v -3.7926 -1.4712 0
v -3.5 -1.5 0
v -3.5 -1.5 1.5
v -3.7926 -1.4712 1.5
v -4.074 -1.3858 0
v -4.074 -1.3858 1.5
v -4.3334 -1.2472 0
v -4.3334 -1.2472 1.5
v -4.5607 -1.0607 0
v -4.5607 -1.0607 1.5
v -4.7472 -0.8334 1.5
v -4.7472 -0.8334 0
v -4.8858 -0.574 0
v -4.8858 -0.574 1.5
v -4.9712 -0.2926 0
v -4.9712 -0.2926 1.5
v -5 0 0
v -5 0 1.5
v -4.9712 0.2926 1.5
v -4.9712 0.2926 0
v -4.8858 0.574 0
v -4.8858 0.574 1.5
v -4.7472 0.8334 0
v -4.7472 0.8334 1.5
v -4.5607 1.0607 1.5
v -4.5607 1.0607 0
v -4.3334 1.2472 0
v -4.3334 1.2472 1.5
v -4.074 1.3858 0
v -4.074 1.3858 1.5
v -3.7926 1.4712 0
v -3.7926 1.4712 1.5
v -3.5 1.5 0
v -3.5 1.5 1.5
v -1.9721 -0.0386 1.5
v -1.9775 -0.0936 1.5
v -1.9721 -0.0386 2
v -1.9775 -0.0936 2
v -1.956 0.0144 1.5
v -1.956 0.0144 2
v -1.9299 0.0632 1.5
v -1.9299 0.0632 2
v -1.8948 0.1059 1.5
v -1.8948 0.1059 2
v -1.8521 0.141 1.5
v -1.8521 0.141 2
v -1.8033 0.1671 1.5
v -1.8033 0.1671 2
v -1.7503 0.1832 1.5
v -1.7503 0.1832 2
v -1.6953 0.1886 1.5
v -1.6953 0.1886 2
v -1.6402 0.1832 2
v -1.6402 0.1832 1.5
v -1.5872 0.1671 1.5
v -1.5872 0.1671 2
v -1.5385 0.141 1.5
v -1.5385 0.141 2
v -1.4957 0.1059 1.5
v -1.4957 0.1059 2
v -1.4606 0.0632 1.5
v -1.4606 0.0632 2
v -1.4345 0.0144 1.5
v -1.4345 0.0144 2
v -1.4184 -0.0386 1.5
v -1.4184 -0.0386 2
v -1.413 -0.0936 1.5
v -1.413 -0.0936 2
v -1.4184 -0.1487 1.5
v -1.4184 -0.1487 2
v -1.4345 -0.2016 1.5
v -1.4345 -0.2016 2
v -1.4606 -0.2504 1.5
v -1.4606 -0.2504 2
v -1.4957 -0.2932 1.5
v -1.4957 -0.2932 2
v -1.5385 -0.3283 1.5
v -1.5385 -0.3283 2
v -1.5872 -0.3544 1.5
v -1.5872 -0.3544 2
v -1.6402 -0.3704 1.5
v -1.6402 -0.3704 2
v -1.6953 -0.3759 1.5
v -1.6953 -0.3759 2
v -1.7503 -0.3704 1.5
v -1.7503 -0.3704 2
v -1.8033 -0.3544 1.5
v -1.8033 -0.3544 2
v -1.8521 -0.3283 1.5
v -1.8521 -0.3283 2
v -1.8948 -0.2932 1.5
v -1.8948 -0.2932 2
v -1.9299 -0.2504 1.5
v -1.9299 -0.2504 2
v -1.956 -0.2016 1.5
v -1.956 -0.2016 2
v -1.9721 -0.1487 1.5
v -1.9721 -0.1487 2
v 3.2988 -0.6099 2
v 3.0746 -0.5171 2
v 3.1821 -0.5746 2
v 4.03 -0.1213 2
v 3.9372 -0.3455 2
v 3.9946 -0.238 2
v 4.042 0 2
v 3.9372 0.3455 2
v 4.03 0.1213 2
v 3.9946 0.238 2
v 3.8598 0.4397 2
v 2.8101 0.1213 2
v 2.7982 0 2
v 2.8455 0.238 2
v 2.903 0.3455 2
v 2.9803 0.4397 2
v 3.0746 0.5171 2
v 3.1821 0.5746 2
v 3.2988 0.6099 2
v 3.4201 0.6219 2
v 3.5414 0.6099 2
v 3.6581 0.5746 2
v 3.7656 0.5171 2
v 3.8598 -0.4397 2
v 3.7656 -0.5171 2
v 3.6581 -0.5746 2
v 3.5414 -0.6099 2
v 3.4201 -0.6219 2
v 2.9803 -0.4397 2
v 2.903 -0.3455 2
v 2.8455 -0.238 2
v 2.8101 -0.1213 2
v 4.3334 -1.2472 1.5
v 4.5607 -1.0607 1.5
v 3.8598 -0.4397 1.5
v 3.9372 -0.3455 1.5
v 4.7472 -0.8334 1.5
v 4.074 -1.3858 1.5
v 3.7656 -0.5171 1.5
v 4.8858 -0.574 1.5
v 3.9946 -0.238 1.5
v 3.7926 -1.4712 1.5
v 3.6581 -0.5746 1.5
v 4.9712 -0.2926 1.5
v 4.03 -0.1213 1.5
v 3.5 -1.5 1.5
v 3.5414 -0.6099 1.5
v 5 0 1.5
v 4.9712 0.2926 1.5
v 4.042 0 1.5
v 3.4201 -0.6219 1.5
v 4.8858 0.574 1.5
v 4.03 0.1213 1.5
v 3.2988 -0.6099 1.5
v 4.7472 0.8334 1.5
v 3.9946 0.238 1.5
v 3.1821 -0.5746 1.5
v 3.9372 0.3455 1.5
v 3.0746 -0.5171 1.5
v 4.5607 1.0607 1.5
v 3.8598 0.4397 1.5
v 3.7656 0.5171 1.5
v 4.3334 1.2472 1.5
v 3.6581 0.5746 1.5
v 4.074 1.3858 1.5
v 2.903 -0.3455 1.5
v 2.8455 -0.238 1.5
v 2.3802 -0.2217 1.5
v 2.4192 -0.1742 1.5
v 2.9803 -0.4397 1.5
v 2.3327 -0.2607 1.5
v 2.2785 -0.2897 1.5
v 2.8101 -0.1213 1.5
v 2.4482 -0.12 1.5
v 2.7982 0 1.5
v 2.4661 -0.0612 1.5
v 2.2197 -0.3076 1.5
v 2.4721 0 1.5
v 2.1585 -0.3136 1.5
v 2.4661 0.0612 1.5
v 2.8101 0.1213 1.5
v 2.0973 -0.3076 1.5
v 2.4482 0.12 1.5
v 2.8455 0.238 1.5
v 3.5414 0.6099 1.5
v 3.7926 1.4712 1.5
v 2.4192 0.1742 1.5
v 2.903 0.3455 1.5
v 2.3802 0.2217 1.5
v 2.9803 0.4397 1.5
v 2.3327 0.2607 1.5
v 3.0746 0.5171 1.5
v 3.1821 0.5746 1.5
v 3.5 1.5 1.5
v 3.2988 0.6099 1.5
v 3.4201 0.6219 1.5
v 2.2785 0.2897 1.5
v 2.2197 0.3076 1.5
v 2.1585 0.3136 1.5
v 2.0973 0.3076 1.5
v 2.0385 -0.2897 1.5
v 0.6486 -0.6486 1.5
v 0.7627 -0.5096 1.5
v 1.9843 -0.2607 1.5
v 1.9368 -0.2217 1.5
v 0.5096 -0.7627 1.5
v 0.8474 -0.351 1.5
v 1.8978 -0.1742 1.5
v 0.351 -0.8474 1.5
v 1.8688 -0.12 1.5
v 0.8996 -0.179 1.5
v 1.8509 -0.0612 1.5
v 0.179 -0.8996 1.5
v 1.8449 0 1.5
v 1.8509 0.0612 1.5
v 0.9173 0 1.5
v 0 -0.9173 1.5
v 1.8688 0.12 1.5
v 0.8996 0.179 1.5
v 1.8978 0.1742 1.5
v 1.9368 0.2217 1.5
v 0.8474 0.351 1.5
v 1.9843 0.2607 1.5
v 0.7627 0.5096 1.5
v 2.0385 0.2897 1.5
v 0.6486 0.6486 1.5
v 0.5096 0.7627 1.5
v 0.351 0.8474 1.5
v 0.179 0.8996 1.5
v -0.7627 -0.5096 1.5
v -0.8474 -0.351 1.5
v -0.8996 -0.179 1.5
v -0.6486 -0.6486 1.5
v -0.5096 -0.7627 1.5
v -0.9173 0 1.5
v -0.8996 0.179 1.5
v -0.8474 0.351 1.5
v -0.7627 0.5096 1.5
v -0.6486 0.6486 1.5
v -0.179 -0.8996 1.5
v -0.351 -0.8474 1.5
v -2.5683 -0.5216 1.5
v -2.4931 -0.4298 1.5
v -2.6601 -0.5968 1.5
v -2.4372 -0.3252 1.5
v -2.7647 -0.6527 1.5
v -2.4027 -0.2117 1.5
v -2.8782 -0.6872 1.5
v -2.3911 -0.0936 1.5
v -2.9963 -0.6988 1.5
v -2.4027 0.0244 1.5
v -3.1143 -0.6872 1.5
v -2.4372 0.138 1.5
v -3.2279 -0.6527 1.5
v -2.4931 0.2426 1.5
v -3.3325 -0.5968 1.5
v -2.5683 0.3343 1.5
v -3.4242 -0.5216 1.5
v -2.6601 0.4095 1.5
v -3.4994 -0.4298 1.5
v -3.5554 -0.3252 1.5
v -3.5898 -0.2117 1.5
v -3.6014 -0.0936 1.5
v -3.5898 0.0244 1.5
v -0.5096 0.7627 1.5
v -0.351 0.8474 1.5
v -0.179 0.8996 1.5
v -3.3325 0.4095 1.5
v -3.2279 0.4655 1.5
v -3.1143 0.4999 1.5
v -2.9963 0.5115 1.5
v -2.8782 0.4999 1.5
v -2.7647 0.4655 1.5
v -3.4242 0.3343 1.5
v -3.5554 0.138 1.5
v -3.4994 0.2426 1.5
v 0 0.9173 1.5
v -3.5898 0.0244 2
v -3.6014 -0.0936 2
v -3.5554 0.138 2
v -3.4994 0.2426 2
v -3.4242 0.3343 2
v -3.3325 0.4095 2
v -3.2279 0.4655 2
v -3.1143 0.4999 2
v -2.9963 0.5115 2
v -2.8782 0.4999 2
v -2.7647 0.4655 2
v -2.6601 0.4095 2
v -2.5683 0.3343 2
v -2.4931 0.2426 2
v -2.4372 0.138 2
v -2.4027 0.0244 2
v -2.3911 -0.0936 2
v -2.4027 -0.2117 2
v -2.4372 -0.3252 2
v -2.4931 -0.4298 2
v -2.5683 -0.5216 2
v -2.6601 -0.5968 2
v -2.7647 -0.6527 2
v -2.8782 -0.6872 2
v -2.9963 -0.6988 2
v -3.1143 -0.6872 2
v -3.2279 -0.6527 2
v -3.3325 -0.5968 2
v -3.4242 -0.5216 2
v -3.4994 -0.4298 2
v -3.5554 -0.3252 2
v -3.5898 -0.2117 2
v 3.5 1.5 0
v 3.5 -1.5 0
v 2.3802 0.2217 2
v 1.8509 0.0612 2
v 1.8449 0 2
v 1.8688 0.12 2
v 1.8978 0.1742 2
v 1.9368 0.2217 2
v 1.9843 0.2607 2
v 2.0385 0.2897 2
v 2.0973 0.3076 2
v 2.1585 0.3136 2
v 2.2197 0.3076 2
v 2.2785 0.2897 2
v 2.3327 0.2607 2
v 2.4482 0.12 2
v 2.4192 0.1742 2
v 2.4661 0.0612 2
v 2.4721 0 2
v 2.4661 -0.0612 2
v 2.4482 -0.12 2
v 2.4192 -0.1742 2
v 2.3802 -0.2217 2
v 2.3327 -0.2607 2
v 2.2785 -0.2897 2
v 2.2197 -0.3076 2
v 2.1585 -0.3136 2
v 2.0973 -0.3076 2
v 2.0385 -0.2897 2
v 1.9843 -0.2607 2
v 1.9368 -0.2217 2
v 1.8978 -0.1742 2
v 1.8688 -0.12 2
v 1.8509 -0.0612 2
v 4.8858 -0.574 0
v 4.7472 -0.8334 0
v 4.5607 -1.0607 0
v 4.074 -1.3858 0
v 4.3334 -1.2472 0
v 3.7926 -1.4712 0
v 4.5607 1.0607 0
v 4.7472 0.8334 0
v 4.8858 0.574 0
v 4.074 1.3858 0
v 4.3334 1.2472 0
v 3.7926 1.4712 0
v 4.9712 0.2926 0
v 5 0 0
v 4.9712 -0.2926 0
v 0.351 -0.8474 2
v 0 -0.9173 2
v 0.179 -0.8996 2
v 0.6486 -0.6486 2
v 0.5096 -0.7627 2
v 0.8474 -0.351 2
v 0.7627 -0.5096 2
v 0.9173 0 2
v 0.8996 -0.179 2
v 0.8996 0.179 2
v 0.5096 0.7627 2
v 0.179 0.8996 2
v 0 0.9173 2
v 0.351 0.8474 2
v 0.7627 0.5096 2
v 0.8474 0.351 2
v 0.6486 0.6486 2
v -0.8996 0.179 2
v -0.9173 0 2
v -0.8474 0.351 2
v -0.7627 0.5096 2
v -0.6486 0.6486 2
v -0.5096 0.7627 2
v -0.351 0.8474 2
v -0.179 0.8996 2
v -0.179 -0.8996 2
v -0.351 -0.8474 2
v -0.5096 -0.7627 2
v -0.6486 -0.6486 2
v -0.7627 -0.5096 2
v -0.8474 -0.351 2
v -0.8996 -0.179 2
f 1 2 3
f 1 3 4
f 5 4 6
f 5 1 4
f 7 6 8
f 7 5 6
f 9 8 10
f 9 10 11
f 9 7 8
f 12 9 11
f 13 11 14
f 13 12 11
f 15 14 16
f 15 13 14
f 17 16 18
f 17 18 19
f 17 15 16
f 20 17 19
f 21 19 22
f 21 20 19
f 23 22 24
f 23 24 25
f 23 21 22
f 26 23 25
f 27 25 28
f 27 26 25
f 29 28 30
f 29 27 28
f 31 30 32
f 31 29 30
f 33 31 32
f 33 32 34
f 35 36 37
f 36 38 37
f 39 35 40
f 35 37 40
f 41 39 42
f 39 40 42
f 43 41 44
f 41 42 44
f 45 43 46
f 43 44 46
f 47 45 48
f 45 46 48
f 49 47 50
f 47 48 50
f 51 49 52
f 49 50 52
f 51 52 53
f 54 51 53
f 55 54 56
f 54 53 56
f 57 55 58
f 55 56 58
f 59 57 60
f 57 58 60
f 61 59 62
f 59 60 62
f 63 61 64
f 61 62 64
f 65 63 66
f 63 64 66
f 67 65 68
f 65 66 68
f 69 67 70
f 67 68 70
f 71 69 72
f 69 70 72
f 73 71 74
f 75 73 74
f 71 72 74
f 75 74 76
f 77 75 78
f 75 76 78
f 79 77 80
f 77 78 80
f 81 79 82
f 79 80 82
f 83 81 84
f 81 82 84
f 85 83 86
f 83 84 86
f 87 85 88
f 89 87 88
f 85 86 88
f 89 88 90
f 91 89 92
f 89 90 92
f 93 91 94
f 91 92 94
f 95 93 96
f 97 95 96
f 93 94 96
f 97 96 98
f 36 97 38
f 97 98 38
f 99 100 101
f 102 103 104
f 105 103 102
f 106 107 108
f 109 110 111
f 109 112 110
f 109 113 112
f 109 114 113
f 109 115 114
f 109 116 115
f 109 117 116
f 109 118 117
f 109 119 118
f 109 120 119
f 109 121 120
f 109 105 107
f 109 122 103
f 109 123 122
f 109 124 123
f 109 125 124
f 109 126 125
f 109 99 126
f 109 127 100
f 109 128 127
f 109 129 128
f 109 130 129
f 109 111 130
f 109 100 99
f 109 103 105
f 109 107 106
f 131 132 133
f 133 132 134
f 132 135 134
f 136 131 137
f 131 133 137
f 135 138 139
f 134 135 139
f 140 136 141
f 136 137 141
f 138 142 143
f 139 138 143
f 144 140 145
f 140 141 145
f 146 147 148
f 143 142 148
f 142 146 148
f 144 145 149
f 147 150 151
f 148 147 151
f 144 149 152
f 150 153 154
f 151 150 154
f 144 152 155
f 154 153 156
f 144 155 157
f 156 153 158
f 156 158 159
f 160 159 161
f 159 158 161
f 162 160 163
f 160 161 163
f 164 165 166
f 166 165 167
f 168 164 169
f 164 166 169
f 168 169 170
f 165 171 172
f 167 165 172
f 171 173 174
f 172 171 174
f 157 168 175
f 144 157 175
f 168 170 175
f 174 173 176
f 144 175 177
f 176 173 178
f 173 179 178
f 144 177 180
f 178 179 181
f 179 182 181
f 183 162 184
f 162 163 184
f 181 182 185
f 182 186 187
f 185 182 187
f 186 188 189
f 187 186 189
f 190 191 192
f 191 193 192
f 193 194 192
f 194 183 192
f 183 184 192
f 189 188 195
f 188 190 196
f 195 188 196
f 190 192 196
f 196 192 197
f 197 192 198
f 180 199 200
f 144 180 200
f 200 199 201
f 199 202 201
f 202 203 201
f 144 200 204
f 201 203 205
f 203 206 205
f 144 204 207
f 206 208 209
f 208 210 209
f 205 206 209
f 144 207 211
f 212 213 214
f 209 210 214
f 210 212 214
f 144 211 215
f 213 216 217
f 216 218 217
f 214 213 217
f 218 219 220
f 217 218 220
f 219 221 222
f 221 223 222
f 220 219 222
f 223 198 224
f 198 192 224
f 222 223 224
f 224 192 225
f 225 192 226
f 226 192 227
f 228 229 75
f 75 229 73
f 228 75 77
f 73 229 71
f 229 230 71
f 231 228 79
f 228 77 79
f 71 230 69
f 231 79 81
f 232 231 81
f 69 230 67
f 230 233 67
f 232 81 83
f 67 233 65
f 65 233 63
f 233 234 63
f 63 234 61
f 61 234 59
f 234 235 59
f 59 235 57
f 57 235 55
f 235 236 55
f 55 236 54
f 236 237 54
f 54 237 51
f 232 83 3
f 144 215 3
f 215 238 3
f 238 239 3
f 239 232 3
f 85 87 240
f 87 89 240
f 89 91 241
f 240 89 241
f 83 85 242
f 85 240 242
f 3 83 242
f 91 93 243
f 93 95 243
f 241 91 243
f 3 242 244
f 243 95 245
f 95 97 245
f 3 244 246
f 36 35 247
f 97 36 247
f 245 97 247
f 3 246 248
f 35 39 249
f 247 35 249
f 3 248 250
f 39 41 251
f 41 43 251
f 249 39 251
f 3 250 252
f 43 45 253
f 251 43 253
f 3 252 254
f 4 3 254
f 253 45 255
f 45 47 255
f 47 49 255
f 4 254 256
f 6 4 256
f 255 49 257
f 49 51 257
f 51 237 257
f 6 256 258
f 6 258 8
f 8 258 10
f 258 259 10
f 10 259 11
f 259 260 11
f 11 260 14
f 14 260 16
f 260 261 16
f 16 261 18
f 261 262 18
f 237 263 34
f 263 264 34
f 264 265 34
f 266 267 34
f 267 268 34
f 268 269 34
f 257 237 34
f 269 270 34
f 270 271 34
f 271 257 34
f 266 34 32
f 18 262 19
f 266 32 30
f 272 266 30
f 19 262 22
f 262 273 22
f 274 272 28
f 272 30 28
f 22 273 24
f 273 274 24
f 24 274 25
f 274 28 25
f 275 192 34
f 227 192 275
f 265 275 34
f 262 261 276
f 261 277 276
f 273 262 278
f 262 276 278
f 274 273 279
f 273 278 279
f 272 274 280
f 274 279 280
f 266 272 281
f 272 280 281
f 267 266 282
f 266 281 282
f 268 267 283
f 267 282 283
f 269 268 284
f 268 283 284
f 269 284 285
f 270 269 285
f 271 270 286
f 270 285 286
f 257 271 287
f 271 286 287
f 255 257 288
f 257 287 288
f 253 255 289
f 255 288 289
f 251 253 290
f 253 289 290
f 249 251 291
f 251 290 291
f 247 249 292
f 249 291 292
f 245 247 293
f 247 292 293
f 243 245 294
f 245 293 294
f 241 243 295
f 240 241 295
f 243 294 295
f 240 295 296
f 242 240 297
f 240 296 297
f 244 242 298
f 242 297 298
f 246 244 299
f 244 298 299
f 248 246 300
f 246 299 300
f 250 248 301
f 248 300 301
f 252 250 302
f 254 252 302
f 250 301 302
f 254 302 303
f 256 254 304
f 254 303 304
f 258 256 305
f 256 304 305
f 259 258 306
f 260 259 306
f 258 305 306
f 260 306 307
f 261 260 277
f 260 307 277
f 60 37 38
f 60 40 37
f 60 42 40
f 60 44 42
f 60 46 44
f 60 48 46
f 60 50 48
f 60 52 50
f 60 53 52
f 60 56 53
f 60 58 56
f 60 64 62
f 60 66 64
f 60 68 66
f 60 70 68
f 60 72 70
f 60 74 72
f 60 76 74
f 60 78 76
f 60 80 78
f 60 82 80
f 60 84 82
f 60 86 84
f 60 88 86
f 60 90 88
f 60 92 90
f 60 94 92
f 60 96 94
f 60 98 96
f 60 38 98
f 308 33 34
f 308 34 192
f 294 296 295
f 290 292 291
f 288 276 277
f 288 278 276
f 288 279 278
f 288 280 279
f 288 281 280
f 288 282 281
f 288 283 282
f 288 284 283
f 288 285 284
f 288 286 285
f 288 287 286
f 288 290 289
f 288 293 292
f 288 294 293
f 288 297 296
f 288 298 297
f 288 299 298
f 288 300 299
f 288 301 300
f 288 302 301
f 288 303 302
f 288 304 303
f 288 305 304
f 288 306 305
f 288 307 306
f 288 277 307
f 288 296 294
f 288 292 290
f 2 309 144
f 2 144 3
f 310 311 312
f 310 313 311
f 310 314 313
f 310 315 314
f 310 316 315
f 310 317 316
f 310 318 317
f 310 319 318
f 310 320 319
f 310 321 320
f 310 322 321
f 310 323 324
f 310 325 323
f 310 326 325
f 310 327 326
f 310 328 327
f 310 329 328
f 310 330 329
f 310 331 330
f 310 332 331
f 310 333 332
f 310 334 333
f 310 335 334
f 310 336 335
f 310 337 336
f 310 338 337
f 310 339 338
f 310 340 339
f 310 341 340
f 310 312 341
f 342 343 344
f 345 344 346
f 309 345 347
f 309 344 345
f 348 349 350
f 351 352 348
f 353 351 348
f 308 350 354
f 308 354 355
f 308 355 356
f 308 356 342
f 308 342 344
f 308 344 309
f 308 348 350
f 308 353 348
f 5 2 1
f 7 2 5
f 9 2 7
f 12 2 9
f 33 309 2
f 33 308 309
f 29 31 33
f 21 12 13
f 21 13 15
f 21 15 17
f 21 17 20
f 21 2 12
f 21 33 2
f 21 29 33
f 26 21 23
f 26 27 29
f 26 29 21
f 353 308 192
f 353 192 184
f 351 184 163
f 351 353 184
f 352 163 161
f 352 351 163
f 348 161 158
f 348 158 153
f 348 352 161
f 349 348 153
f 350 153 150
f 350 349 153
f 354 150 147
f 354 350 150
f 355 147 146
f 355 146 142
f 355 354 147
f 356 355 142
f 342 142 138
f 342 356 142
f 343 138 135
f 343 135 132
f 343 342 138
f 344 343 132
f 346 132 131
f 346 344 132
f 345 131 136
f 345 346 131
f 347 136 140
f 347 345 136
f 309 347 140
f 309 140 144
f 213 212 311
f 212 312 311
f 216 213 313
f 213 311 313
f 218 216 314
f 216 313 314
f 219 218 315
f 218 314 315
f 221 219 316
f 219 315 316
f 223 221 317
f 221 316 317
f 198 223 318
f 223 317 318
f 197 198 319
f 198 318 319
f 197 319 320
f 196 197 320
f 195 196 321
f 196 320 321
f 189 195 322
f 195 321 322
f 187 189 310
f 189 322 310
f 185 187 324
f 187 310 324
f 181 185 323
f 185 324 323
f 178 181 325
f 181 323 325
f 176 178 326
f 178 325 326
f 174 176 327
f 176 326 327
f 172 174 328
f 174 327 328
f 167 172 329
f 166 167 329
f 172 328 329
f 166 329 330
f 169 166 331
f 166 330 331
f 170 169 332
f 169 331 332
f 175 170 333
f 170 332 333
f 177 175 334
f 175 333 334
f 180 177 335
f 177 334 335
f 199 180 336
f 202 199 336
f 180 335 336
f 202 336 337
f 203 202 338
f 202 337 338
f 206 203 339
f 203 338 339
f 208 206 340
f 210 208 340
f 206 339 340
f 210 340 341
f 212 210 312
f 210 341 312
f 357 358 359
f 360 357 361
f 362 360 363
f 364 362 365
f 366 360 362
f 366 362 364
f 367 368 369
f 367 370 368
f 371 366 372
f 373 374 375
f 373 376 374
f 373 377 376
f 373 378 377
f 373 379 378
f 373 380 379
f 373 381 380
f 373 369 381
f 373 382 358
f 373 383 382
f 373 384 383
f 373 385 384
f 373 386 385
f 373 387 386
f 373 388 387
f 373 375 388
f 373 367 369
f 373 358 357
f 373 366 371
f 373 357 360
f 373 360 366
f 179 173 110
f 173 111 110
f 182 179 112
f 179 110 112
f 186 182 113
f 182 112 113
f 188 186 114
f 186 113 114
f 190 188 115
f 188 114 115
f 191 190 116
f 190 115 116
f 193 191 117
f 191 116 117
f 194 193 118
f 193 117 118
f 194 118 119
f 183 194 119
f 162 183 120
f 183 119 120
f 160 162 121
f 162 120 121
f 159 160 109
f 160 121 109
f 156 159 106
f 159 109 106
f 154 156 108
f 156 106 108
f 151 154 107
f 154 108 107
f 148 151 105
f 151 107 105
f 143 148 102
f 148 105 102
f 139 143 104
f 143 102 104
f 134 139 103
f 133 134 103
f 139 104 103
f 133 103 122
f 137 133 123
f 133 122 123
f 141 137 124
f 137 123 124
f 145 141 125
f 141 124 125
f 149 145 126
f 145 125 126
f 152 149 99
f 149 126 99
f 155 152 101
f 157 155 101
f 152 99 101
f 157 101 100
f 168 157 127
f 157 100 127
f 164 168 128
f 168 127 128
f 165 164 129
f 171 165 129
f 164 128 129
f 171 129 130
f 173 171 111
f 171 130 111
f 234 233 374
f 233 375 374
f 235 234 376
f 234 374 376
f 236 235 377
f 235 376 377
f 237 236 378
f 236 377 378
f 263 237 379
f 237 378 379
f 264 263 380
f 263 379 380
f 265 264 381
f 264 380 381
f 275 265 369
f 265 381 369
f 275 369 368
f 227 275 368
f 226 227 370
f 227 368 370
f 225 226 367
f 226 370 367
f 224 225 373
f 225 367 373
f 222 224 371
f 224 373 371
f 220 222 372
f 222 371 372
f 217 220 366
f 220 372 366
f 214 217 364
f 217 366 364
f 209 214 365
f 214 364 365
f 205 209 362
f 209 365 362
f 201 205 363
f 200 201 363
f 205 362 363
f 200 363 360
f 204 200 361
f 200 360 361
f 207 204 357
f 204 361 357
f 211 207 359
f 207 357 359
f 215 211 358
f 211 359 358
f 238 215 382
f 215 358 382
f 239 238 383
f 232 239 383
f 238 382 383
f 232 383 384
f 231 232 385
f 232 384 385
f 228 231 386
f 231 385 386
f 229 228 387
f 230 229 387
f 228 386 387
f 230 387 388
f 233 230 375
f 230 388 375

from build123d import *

# Parameters (mm, degrees)
BOSS_EXTRUDE1_DEPTH = 1.5
SKETCH2_W           = 0.621894726
SKETCH2_H           = 0.5
SKETCH3_W           = 0.313581939
SKETCH3_H           = 0.5
SKETCH4_W           = 0.917270519
SKETCH4_H           = 0.5
SKETCH5_W           = 0.282237083
SKETCH5_H           = 0.5
SKETCH6_W           = 0.605170604
SKETCH6_H           = 0.5


with BuildPart() as part:
    # Sketch1 → Boss-Extrude1 (new body)
    with BuildSketch(Plane(origin=(0, 0, 0), x_dir=(-1, 0, 0), z_dir=(0, 0, -1))):
        with BuildLine():
            Line((3.5, 1.5), (-3.5, 1.5))
            ThreePointArc((-3.5, 1.5), (-5, 0), (-3.5, -1.5))
            Line((-3.5, -1.5), (3.5, -1.5))
            ThreePointArc((3.5, -1.5), (5, 0), (3.5, 1.5))
        make_face()
    extrude(amount=-BOSS_EXTRUDE1_DEPTH)

    # Sketch2 → Revolve1 (revolve)
    with BuildSketch(Plane.XZ, mode=Mode.PRIVATE) as revolve1_sk:
        with Locations((3.731030185, 1.75)):
            Rectangle(SKETCH2_W, SKETCH2_H)
    revolve(revolve1_sk.sketch.rotate(Axis((3.420082822, 0, 2), (0, 0, -1)), 180), axis=Axis((3.420082822, 0, 2), (0, 0, -1)))

    # Sketch3 → Revolve2 (revolve)
    with BuildSketch(Plane.XZ, mode=Mode.PRIVATE) as revolve2_sk:
        with Locations((2.315287044, 1.75)):
            Rectangle(SKETCH3_W, SKETCH3_H)
    revolve(revolve2_sk.sketch.rotate(Axis((2.158496075, 0, 2), (0, 0, -1)), 180), axis=Axis((2.158496075, 0, 2), (0, 0, -1)))

    # Sketch4 → Revolve3 (revolve)
    with BuildSketch(Plane.XZ, mode=Mode.PRIVATE) as revolve3_sk:
        with Locations((0.45863526, 1.75)):
            Rectangle(SKETCH4_W, SKETCH4_H)
    revolve(revolve3_sk.sketch.rotate(Axis((0, 0, 2), (0, 0, -1)), 180), axis=Axis((0, 0, 2), (0, 0, -1)))

    # Sketch5 → Revolve4 (revolve)
    with BuildSketch(Plane.XZ.offset(0.093633391), mode=Mode.PRIVATE) as revolve4_sk:
        with Locations((-1.554138651, 1.75)):
            Rectangle(SKETCH5_W, SKETCH5_H)
    revolve(revolve4_sk.sketch.rotate(Axis((-1.695257192, -0.093633391, 2), (0, 0, -1)), 180), axis=Axis((-1.695257192, -0.093633391, 2), (0, 0, -1)))

    # Sketch6 → Revolve5 (revolve)
    with BuildSketch(Plane.XZ.offset(0.093633391), mode=Mode.PRIVATE) as revolve5_sk:
        with Locations((-2.693683223, 1.75)):
            Rectangle(SKETCH6_W, SKETCH6_H)
    revolve(revolve5_sk.sketch.rotate(Axis((-2.996268525, -0.093633391, 2), (0, 0, -1)), 180), axis=Axis((-2.996268525, -0.093633391, 2), (0, 0, -1)))


solid = part.part
